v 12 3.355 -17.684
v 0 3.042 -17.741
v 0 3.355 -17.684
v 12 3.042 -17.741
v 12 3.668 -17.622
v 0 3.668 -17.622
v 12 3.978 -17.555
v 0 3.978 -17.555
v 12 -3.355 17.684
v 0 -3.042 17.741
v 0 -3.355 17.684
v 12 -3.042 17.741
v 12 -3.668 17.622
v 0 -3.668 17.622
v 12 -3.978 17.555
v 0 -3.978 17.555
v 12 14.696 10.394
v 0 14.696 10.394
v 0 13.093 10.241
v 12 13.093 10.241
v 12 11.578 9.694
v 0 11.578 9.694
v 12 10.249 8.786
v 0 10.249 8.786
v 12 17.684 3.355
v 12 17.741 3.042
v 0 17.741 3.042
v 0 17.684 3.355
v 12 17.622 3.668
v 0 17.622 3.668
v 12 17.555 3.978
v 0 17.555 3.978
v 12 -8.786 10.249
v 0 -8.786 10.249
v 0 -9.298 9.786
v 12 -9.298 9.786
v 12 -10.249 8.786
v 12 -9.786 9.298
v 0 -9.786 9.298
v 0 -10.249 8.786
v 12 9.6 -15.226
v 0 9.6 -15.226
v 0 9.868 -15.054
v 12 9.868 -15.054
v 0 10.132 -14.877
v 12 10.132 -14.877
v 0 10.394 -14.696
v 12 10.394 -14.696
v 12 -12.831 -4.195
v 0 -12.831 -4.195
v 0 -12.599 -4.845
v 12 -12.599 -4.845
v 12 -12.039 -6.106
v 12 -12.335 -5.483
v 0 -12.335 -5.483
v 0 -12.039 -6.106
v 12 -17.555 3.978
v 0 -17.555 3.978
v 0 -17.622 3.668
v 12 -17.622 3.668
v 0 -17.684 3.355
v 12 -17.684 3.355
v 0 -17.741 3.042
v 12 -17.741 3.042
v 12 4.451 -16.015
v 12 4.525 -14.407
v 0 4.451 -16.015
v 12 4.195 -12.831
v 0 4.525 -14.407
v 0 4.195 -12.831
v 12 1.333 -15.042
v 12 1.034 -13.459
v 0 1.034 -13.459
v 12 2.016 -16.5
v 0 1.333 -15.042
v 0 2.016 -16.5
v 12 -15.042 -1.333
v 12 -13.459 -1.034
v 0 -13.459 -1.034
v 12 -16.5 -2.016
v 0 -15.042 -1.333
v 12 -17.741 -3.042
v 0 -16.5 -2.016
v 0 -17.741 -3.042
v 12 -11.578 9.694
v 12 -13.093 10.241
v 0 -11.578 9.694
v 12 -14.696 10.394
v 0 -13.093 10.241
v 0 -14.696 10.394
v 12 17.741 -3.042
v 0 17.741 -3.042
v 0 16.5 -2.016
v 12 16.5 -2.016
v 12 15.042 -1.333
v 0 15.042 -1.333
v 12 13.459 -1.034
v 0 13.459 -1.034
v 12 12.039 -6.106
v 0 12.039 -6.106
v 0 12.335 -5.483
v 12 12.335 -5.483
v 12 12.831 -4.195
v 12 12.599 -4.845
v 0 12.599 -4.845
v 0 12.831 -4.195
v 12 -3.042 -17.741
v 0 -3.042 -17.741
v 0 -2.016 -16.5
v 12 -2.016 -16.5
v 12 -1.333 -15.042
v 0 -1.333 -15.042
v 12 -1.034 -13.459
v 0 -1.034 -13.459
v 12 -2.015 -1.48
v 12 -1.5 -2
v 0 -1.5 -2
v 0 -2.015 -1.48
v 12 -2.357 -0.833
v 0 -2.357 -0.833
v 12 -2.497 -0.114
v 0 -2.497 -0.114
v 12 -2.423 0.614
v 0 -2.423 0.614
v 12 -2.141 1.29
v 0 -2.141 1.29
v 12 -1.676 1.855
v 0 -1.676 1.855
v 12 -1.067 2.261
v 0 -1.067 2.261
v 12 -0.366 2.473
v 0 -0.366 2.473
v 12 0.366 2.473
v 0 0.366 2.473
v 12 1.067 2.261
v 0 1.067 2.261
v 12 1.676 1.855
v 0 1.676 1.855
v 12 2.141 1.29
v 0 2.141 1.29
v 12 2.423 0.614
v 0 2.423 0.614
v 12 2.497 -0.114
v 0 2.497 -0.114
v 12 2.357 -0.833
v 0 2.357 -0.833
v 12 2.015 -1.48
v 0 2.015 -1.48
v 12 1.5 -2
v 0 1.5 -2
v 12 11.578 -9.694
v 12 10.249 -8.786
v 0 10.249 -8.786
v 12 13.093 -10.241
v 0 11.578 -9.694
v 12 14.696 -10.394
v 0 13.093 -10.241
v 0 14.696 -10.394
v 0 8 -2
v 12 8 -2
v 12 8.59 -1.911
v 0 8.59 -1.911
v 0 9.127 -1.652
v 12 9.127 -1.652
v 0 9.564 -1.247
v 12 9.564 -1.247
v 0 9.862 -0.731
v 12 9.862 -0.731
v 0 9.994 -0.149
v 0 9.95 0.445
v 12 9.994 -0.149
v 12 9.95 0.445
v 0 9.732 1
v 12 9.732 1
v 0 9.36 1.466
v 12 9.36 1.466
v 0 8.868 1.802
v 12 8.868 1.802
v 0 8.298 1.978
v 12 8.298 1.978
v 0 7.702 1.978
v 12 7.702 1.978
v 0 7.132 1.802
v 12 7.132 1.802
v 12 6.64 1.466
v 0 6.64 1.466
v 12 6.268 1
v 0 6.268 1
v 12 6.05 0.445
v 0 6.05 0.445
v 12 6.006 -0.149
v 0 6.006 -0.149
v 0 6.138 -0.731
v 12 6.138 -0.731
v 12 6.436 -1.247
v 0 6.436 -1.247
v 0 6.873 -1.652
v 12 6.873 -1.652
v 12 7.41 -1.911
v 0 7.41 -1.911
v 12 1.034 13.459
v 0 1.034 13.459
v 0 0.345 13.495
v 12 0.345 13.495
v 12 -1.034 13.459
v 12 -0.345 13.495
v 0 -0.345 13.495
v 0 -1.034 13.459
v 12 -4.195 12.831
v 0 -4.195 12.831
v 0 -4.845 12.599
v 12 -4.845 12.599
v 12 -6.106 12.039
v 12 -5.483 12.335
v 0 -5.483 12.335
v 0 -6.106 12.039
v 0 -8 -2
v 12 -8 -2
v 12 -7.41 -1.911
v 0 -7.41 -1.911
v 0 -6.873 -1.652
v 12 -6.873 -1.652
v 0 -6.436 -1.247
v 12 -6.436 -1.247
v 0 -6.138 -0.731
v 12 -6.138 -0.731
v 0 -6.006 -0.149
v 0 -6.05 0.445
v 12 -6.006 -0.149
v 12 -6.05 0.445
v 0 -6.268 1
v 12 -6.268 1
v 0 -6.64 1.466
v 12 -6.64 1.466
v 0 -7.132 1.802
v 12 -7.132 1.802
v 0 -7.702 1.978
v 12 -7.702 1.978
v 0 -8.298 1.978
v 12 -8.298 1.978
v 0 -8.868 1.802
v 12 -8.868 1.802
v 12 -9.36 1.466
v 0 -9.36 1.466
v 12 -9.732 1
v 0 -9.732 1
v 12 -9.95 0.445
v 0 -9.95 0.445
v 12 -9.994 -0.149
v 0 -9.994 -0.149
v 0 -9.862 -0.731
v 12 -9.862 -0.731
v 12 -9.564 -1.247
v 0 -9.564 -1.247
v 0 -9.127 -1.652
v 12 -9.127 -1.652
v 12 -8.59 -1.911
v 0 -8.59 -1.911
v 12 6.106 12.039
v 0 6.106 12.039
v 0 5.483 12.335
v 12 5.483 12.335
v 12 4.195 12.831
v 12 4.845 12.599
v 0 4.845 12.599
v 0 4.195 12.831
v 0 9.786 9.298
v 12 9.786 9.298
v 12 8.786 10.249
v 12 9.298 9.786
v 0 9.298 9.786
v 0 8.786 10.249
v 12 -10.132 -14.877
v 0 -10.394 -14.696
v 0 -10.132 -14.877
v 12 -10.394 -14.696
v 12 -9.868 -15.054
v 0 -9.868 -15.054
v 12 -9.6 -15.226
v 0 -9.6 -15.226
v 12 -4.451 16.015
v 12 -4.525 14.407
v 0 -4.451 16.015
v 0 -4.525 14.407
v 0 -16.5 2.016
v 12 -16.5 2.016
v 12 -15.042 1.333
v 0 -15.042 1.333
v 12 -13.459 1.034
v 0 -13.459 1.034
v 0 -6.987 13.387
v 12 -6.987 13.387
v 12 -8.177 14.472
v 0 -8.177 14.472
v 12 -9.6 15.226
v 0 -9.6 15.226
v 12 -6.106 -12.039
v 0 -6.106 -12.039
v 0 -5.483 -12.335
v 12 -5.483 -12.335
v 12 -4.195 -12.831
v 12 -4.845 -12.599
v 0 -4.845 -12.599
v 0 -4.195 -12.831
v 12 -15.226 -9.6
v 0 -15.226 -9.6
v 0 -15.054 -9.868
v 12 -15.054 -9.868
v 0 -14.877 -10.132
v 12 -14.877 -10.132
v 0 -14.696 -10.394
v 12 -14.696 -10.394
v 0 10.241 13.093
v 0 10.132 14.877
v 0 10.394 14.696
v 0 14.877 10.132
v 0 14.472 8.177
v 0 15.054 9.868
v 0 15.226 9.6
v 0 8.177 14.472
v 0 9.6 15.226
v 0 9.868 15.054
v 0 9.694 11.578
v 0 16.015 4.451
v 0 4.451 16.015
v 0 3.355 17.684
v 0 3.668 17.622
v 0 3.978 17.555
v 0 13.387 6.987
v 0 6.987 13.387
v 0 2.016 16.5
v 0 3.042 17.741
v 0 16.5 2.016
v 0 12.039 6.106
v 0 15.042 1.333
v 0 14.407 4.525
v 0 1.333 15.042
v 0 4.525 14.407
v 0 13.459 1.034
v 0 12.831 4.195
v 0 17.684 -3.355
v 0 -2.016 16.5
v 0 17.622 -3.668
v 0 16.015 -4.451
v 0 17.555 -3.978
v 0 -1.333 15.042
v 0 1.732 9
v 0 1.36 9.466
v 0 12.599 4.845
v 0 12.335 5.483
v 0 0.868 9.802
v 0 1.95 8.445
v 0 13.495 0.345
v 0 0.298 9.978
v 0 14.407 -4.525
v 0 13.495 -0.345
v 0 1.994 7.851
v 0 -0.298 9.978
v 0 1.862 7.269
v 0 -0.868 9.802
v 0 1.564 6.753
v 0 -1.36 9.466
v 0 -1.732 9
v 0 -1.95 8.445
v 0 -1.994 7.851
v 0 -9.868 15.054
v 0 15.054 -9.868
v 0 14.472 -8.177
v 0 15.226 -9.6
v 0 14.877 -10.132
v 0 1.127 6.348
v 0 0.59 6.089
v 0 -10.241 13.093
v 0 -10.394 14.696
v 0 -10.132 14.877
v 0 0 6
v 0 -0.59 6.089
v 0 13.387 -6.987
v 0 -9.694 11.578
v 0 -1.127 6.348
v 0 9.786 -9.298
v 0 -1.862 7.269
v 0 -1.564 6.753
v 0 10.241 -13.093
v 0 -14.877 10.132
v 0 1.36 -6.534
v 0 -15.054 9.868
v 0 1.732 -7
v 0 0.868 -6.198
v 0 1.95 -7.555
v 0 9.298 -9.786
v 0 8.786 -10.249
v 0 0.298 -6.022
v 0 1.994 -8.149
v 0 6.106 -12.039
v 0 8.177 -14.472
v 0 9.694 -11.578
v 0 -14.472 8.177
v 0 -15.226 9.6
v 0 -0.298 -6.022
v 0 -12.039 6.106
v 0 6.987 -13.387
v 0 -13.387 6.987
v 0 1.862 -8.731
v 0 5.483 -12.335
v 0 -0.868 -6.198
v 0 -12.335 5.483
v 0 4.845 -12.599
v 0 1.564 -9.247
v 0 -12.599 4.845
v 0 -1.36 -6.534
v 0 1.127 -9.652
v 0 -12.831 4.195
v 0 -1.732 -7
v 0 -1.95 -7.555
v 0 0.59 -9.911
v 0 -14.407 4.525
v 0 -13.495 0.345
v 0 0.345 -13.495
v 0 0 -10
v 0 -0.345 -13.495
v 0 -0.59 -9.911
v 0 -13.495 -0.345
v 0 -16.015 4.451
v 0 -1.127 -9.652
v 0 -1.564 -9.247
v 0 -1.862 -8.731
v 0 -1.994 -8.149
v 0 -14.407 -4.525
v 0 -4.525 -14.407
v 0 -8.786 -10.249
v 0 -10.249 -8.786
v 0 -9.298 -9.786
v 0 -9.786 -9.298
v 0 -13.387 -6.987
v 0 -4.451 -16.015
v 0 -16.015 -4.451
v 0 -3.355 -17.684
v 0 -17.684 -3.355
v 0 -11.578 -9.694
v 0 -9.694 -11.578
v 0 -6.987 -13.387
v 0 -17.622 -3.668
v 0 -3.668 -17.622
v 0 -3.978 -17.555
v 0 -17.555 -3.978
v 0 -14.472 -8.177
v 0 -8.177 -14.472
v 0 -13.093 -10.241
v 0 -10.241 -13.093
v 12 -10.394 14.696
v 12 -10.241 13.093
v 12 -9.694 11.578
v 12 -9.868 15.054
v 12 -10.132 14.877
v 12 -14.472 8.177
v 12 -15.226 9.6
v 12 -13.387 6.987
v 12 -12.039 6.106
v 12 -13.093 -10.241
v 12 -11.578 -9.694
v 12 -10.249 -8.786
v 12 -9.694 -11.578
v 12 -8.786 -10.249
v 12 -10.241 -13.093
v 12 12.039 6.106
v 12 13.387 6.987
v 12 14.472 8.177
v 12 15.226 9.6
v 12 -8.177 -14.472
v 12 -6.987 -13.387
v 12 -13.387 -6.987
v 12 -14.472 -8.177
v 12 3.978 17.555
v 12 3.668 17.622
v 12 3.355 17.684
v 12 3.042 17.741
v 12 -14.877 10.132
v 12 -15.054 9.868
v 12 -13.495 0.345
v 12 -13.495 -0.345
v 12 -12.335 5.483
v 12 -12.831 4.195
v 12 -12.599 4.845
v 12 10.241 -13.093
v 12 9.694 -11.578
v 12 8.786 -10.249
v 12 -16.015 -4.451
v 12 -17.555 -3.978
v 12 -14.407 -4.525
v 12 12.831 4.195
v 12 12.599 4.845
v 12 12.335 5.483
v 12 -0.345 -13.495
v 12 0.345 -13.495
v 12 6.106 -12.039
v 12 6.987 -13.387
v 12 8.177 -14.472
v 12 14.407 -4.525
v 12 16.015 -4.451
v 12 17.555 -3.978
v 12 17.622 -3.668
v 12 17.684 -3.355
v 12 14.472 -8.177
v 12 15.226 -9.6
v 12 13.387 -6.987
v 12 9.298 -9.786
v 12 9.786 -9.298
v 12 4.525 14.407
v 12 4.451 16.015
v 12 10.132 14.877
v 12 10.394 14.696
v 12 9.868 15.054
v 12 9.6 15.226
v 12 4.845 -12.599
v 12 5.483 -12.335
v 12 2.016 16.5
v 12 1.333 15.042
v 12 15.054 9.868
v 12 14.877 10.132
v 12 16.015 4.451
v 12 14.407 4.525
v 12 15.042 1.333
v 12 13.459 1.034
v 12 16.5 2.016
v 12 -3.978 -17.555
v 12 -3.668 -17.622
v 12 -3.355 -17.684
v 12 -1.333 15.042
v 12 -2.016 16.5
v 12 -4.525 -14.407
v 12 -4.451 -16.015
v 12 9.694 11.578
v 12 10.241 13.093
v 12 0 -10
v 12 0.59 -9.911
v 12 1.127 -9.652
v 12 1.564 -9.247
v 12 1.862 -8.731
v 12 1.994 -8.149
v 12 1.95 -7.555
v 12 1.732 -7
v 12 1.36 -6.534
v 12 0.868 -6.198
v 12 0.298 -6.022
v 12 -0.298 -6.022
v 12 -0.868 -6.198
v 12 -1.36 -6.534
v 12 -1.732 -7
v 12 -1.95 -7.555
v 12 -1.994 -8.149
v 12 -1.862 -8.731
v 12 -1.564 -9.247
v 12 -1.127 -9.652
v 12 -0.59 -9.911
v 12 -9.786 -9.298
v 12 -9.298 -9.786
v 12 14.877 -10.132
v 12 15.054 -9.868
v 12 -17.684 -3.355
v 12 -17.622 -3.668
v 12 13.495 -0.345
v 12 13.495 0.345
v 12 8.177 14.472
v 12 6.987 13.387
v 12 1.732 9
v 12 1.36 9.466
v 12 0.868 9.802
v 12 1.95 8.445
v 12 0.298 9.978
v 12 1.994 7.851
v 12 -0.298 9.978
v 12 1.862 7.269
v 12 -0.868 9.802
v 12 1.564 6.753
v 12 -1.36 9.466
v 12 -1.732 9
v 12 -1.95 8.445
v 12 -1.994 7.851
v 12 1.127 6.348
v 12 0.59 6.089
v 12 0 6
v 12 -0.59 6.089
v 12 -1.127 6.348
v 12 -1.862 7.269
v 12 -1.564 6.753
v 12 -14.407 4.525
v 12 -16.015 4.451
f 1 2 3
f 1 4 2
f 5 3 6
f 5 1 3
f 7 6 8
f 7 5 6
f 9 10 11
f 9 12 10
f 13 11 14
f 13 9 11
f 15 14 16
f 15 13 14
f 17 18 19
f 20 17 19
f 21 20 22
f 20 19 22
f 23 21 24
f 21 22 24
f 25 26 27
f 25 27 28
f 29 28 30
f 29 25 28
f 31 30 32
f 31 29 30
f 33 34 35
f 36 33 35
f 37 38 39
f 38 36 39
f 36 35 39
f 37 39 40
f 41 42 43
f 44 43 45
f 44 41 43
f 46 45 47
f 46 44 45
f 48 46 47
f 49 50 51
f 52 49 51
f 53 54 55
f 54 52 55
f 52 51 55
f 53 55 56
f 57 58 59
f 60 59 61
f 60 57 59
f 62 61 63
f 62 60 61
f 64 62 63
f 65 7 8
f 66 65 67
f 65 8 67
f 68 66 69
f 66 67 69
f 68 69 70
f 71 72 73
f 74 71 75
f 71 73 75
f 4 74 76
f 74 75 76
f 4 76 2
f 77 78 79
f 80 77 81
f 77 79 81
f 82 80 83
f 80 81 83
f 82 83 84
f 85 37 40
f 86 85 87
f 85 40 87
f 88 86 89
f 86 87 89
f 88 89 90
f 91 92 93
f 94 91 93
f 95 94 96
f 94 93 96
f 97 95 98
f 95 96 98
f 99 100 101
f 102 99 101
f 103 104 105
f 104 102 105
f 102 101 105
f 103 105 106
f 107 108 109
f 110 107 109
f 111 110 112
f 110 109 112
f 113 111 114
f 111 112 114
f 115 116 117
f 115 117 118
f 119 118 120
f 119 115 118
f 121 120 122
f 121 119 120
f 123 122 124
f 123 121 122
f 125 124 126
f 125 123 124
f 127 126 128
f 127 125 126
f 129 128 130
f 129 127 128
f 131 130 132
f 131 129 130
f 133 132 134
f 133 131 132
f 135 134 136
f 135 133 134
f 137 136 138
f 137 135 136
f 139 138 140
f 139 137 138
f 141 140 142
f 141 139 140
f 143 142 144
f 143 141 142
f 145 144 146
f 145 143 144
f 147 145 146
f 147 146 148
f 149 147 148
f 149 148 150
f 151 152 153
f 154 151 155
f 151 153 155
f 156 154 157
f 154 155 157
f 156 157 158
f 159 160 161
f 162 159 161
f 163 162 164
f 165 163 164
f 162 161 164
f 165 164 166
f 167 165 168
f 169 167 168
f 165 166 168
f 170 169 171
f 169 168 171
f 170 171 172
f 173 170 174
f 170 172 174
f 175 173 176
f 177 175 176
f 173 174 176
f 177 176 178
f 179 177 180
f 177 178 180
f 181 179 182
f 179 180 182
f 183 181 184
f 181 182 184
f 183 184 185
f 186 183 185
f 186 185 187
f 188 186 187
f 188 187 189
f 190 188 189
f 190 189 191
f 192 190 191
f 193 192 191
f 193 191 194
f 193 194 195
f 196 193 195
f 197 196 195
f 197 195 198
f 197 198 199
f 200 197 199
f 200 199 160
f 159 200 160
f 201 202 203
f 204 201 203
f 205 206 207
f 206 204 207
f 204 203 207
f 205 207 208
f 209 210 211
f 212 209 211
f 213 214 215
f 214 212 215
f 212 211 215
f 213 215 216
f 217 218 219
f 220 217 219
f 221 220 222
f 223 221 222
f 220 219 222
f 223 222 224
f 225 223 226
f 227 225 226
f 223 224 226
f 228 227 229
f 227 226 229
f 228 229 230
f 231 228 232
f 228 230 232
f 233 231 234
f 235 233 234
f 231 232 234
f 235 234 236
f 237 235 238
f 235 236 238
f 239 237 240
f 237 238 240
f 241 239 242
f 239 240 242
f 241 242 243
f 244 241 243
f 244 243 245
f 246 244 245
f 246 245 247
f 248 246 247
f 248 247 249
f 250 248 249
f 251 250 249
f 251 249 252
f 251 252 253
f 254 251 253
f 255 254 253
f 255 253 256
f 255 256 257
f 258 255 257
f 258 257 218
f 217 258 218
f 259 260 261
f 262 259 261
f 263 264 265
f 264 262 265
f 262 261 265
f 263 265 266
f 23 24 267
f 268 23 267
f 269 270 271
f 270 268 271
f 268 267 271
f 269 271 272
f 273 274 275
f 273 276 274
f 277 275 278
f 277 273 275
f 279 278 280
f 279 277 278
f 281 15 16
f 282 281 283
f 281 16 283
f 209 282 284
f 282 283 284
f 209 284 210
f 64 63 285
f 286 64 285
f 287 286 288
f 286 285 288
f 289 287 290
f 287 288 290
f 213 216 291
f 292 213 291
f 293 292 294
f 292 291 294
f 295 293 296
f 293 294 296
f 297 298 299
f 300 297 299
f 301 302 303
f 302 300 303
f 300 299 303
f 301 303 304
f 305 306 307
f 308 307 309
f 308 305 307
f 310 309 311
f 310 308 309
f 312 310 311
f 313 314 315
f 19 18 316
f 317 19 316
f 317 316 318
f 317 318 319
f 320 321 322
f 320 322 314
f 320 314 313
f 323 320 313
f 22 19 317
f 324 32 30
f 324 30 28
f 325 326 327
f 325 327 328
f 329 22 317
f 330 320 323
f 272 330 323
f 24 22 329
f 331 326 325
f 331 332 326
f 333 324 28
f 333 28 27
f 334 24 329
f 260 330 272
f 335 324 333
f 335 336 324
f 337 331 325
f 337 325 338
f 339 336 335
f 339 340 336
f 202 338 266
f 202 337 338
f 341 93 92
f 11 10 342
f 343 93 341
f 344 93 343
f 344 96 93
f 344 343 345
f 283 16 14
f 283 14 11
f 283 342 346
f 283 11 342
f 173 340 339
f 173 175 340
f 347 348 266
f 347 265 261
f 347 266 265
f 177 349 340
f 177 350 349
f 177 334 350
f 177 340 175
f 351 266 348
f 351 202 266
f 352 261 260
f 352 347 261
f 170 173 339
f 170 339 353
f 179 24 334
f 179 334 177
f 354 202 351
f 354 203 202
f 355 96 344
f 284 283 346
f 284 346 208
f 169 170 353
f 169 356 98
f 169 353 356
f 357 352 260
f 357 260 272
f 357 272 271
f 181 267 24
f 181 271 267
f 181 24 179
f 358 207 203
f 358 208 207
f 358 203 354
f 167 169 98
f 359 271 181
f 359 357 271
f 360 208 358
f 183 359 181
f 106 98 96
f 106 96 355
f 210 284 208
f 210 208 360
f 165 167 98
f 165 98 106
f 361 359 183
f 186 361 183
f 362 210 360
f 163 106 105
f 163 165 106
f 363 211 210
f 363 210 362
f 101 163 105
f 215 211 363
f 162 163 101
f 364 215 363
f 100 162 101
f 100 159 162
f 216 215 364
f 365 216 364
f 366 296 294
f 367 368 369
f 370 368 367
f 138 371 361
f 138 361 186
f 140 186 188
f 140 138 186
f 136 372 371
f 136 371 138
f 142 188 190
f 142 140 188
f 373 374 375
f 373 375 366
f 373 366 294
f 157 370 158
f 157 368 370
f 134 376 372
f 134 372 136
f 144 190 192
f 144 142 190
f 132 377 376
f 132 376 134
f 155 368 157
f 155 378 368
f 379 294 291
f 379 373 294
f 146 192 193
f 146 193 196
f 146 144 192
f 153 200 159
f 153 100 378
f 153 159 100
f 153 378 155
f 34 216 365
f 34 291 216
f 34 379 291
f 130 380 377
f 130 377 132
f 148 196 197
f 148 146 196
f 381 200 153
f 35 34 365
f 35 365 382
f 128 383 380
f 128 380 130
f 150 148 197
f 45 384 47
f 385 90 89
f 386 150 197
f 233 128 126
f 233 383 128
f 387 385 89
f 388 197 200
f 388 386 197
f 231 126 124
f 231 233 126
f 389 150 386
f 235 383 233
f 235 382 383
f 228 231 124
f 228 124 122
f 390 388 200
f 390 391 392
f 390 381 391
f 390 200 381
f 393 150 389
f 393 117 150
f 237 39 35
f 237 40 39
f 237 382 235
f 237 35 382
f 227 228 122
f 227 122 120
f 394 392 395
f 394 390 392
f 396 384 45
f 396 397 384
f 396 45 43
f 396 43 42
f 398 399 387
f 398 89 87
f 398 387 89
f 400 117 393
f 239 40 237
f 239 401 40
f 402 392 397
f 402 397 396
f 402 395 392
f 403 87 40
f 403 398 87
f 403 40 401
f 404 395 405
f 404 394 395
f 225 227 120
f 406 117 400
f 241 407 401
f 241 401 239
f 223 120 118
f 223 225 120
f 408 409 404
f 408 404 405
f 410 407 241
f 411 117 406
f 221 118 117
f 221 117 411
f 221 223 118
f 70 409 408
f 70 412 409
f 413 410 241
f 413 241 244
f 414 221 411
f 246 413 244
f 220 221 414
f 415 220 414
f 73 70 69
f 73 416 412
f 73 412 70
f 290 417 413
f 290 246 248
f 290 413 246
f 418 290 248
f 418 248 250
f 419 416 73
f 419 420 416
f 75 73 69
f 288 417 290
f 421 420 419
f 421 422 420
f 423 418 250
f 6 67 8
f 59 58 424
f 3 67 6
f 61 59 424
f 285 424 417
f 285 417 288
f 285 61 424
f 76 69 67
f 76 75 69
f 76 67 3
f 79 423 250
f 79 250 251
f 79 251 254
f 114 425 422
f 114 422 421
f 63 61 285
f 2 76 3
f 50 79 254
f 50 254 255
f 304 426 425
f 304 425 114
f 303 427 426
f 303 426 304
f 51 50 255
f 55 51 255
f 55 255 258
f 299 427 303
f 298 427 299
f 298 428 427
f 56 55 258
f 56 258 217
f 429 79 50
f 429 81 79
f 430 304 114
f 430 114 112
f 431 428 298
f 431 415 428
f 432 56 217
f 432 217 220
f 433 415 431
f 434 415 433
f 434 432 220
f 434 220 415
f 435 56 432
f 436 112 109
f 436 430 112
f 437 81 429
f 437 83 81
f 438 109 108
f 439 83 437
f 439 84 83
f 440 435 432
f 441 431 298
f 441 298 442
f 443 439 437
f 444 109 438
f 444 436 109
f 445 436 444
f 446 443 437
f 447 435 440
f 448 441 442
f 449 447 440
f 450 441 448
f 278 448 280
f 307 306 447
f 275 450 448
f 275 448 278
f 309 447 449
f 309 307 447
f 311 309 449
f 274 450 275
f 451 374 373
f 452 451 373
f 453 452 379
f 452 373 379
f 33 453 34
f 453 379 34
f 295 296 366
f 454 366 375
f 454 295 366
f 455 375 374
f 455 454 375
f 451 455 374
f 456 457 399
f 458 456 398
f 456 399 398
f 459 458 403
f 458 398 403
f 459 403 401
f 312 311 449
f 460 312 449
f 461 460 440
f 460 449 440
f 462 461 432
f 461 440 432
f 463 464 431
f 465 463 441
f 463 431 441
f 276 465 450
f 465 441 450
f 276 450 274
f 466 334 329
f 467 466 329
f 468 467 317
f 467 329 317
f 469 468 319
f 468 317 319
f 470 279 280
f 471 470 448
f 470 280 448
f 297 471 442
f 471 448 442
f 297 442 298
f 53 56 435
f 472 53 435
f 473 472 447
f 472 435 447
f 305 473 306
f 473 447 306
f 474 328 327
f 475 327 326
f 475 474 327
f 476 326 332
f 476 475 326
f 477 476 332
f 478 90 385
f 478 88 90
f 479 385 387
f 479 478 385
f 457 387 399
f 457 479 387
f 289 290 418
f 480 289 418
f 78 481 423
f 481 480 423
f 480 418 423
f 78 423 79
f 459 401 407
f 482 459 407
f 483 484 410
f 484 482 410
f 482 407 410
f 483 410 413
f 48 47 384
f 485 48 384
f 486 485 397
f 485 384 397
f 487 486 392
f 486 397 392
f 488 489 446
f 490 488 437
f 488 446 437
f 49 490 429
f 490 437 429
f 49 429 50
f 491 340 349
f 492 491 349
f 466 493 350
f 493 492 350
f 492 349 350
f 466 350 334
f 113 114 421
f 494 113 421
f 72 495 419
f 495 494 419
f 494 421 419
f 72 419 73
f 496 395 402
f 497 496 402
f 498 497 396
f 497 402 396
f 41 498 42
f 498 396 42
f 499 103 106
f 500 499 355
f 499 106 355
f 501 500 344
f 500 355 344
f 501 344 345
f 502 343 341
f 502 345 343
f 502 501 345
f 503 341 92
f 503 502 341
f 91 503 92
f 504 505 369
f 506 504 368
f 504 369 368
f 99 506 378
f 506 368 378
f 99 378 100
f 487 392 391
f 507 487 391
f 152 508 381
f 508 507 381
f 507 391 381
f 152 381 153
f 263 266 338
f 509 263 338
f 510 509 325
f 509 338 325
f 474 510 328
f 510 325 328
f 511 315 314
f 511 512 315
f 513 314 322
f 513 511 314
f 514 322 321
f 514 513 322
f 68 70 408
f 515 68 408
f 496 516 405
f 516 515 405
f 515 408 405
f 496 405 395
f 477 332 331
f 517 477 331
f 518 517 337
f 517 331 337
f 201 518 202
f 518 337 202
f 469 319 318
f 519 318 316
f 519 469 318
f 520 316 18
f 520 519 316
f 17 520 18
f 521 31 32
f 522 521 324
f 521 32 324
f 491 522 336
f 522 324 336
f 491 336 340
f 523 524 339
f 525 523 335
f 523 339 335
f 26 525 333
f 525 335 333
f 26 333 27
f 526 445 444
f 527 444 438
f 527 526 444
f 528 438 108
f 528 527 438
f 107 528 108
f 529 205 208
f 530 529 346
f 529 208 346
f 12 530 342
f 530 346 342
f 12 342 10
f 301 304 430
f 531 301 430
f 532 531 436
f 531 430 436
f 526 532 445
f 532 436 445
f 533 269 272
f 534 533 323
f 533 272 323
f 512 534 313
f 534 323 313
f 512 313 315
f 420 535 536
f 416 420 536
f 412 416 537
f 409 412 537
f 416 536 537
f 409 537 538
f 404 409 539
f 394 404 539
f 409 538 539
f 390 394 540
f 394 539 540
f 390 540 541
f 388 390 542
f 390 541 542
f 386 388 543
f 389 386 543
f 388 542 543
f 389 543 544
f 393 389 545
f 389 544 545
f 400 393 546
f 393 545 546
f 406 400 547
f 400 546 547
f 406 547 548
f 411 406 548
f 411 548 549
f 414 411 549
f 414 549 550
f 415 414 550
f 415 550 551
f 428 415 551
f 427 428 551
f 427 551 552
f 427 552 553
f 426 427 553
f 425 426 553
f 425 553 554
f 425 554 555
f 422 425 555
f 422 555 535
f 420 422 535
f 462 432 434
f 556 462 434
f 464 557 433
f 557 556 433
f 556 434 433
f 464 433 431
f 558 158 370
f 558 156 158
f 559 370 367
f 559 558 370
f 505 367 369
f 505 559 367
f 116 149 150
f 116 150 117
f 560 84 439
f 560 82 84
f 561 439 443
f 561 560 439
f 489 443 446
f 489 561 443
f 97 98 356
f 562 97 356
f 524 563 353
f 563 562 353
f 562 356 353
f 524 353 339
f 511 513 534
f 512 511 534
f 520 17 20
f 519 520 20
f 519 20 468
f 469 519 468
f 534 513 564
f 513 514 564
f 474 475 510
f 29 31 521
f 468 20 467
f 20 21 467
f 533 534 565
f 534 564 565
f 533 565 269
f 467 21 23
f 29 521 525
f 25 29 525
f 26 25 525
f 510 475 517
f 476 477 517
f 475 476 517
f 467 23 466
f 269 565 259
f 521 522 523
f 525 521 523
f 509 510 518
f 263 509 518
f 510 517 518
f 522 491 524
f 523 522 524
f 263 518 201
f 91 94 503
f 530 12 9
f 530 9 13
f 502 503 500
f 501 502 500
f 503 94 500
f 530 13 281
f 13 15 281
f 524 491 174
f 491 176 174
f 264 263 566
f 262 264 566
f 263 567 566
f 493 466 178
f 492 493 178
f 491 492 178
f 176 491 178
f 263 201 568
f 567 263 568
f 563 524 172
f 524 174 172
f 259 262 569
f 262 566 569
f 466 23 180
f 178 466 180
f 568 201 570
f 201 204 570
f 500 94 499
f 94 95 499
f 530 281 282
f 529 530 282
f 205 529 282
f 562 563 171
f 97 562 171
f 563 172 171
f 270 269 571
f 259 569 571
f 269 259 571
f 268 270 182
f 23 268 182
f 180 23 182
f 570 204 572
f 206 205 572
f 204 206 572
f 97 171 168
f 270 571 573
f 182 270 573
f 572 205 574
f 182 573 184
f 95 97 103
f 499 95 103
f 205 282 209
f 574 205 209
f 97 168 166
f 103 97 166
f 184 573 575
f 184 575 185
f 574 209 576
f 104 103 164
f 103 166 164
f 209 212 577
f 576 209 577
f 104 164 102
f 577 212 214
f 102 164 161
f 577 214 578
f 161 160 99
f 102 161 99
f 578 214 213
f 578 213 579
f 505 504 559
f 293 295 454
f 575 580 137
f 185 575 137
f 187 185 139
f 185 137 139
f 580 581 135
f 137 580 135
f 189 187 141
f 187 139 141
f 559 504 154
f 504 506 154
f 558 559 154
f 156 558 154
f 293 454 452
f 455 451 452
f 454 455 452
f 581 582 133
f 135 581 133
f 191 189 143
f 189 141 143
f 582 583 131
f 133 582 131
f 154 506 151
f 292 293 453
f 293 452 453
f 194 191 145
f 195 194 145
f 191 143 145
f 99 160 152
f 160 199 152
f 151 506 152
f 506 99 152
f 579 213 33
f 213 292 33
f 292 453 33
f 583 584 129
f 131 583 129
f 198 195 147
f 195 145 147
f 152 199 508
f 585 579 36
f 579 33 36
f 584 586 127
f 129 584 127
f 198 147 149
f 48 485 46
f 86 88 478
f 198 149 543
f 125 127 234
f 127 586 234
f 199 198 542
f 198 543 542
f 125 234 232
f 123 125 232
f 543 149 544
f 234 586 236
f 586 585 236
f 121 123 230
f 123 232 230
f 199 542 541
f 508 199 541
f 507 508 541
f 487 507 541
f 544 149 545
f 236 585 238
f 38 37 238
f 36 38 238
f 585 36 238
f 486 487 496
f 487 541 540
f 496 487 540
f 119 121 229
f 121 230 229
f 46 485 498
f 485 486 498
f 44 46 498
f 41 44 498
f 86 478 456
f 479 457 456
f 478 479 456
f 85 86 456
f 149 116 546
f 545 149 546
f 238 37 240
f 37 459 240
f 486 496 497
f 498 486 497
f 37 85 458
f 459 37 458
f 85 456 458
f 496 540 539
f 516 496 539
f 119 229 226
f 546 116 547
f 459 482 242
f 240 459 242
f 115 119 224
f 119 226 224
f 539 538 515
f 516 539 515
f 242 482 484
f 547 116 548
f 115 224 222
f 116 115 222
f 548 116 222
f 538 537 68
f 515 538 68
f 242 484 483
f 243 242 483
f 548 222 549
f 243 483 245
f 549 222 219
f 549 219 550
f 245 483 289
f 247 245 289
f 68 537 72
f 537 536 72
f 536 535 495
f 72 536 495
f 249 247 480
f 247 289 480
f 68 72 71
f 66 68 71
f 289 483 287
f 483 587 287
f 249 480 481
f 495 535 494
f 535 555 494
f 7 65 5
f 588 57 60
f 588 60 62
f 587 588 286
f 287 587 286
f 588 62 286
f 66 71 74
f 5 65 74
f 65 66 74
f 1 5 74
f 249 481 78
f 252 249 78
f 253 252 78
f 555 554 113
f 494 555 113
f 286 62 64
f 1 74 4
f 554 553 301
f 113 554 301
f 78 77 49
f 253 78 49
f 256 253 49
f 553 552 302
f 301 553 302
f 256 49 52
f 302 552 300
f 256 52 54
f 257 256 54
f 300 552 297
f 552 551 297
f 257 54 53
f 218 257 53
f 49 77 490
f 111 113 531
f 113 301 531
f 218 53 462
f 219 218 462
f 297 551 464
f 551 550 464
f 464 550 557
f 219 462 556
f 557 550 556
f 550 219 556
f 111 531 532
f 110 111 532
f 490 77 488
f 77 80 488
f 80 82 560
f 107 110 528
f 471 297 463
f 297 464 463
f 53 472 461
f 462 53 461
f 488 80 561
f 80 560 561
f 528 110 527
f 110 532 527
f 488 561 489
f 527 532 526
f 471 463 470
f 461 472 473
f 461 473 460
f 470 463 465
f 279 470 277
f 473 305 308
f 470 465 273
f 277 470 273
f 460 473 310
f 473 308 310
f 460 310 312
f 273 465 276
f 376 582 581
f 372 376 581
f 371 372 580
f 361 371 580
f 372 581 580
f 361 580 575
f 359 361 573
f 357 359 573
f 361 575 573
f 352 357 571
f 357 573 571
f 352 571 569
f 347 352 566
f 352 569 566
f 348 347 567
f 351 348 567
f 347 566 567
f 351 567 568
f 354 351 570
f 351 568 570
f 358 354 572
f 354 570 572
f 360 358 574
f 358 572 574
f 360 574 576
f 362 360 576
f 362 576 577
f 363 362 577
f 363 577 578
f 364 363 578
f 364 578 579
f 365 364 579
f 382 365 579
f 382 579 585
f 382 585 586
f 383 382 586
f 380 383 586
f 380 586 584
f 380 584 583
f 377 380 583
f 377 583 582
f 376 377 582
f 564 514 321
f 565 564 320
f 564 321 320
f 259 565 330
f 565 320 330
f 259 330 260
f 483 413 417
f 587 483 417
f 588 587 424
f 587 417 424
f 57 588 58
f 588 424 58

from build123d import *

# Parameters (mm, degrees)
BASPROSKE_W        = 12
BASPROSKE_H        = 18
TOOTHCUT_DEPTH     = 29.142494559
TEETHCUTS_COUNT    = 16
TEETHCUTS_ANGLE    = 337.5
BORSKE_R           = 2
BORE_DEPTH         = 50.0000508
SKETCH1_R          = 2
CUT_EXTRUDE1_DEPTH = 18


with BuildPart() as part:
    # BasProSke → Base-Revolve (revolve)
    with BuildSketch(Plane(origin=(0, 0, 0), x_dir=(1, 0, 0), z_dir=(0, 1, 0)), mode=Mode.PRIVATE) as base_revolve_sk:
        with Locations((6, 9)):
            Rectangle(BASPROSKE_W, BASPROSKE_H)
    revolve(base_revolve_sk.sketch.rotate(Axis((-10, 0, 0), (1, 0, 0)), 180), axis=Axis((-10, 0, 0), (1, 0, 0)))

    # TooCutSke → ToothCut (cut, through all)
    with BuildSketch(Plane(origin=(0, 0, 0), x_dir=(0, 0, -1), z_dir=(1, 0, 0))):
        with BuildLine():
            ThreePointArc((1.03434411, 13.459313997), (0, 13.499), (-1.03434411, 13.459313997))
            ThreePointArc((-1.03434411, 13.459313997), (-1.635143665, 15.806872195), (-3.065655864, 17.762792553))
            ThreePointArc((-3.065655864, 17.762792553), (0, 18.0254), (3.065655864, 17.762792553))
            ThreePointArc((3.065655864, 17.762792553), (1.635143665, 15.806872195), (1.03434411, 13.459313997))
        make_face()
    toothcut = extrude(amount=TOOTHCUT_DEPTH, mode=Mode.SUBTRACT)

    # TeethCuts: ToothCut ×16 about axis
    teethcuts_axis = Axis((-10, 0, 0), (1, 0, 0))
    for i in range(1, TEETHCUTS_COUNT):
        add(toothcut.rotate(teethcuts_axis, i * TEETHCUTS_ANGLE / (TEETHCUTS_COUNT - 1)), mode=Mode.SUBTRACT)

    # BorSke → Bore (cut, symmetric)
    with BuildSketch(Plane(origin=(0, 0, 0), x_dir=(0, 0, -1), z_dir=(1, 0, 0))):
        with Locations(Location((0, 0, 0), (0, 0, 180))):
            Circle(BORSKE_R)
    extrude(amount=BORE_DEPTH, both=True, mode=Mode.SUBTRACT)

    # Sketch1 → Cut-Extrude1 (cut)
    with BuildSketch(Plane(origin=(12, 0, 0), x_dir=(0, 0, -1), z_dir=(1, 0, 0))):
        with Locations((0, 8)):
            Circle(SKETCH1_R)
        with Locations((0, -8)):
            Circle(SKETCH1_R)
        with Locations((8, 0)):
            Circle(SKETCH1_R)
        with Locations((-8, 0)):
            Circle(SKETCH1_R)
        with BuildLine():
            Line((2, 1.5), (2, -1.5))
            ThreePointArc((2, -1.5), (-2.5, 0), (2, 1.5))
        make_face()
    extrude(amount=-CUT_EXTRUDE1_DEPTH, mode=Mode.SUBTRACT)


solid = part.part
